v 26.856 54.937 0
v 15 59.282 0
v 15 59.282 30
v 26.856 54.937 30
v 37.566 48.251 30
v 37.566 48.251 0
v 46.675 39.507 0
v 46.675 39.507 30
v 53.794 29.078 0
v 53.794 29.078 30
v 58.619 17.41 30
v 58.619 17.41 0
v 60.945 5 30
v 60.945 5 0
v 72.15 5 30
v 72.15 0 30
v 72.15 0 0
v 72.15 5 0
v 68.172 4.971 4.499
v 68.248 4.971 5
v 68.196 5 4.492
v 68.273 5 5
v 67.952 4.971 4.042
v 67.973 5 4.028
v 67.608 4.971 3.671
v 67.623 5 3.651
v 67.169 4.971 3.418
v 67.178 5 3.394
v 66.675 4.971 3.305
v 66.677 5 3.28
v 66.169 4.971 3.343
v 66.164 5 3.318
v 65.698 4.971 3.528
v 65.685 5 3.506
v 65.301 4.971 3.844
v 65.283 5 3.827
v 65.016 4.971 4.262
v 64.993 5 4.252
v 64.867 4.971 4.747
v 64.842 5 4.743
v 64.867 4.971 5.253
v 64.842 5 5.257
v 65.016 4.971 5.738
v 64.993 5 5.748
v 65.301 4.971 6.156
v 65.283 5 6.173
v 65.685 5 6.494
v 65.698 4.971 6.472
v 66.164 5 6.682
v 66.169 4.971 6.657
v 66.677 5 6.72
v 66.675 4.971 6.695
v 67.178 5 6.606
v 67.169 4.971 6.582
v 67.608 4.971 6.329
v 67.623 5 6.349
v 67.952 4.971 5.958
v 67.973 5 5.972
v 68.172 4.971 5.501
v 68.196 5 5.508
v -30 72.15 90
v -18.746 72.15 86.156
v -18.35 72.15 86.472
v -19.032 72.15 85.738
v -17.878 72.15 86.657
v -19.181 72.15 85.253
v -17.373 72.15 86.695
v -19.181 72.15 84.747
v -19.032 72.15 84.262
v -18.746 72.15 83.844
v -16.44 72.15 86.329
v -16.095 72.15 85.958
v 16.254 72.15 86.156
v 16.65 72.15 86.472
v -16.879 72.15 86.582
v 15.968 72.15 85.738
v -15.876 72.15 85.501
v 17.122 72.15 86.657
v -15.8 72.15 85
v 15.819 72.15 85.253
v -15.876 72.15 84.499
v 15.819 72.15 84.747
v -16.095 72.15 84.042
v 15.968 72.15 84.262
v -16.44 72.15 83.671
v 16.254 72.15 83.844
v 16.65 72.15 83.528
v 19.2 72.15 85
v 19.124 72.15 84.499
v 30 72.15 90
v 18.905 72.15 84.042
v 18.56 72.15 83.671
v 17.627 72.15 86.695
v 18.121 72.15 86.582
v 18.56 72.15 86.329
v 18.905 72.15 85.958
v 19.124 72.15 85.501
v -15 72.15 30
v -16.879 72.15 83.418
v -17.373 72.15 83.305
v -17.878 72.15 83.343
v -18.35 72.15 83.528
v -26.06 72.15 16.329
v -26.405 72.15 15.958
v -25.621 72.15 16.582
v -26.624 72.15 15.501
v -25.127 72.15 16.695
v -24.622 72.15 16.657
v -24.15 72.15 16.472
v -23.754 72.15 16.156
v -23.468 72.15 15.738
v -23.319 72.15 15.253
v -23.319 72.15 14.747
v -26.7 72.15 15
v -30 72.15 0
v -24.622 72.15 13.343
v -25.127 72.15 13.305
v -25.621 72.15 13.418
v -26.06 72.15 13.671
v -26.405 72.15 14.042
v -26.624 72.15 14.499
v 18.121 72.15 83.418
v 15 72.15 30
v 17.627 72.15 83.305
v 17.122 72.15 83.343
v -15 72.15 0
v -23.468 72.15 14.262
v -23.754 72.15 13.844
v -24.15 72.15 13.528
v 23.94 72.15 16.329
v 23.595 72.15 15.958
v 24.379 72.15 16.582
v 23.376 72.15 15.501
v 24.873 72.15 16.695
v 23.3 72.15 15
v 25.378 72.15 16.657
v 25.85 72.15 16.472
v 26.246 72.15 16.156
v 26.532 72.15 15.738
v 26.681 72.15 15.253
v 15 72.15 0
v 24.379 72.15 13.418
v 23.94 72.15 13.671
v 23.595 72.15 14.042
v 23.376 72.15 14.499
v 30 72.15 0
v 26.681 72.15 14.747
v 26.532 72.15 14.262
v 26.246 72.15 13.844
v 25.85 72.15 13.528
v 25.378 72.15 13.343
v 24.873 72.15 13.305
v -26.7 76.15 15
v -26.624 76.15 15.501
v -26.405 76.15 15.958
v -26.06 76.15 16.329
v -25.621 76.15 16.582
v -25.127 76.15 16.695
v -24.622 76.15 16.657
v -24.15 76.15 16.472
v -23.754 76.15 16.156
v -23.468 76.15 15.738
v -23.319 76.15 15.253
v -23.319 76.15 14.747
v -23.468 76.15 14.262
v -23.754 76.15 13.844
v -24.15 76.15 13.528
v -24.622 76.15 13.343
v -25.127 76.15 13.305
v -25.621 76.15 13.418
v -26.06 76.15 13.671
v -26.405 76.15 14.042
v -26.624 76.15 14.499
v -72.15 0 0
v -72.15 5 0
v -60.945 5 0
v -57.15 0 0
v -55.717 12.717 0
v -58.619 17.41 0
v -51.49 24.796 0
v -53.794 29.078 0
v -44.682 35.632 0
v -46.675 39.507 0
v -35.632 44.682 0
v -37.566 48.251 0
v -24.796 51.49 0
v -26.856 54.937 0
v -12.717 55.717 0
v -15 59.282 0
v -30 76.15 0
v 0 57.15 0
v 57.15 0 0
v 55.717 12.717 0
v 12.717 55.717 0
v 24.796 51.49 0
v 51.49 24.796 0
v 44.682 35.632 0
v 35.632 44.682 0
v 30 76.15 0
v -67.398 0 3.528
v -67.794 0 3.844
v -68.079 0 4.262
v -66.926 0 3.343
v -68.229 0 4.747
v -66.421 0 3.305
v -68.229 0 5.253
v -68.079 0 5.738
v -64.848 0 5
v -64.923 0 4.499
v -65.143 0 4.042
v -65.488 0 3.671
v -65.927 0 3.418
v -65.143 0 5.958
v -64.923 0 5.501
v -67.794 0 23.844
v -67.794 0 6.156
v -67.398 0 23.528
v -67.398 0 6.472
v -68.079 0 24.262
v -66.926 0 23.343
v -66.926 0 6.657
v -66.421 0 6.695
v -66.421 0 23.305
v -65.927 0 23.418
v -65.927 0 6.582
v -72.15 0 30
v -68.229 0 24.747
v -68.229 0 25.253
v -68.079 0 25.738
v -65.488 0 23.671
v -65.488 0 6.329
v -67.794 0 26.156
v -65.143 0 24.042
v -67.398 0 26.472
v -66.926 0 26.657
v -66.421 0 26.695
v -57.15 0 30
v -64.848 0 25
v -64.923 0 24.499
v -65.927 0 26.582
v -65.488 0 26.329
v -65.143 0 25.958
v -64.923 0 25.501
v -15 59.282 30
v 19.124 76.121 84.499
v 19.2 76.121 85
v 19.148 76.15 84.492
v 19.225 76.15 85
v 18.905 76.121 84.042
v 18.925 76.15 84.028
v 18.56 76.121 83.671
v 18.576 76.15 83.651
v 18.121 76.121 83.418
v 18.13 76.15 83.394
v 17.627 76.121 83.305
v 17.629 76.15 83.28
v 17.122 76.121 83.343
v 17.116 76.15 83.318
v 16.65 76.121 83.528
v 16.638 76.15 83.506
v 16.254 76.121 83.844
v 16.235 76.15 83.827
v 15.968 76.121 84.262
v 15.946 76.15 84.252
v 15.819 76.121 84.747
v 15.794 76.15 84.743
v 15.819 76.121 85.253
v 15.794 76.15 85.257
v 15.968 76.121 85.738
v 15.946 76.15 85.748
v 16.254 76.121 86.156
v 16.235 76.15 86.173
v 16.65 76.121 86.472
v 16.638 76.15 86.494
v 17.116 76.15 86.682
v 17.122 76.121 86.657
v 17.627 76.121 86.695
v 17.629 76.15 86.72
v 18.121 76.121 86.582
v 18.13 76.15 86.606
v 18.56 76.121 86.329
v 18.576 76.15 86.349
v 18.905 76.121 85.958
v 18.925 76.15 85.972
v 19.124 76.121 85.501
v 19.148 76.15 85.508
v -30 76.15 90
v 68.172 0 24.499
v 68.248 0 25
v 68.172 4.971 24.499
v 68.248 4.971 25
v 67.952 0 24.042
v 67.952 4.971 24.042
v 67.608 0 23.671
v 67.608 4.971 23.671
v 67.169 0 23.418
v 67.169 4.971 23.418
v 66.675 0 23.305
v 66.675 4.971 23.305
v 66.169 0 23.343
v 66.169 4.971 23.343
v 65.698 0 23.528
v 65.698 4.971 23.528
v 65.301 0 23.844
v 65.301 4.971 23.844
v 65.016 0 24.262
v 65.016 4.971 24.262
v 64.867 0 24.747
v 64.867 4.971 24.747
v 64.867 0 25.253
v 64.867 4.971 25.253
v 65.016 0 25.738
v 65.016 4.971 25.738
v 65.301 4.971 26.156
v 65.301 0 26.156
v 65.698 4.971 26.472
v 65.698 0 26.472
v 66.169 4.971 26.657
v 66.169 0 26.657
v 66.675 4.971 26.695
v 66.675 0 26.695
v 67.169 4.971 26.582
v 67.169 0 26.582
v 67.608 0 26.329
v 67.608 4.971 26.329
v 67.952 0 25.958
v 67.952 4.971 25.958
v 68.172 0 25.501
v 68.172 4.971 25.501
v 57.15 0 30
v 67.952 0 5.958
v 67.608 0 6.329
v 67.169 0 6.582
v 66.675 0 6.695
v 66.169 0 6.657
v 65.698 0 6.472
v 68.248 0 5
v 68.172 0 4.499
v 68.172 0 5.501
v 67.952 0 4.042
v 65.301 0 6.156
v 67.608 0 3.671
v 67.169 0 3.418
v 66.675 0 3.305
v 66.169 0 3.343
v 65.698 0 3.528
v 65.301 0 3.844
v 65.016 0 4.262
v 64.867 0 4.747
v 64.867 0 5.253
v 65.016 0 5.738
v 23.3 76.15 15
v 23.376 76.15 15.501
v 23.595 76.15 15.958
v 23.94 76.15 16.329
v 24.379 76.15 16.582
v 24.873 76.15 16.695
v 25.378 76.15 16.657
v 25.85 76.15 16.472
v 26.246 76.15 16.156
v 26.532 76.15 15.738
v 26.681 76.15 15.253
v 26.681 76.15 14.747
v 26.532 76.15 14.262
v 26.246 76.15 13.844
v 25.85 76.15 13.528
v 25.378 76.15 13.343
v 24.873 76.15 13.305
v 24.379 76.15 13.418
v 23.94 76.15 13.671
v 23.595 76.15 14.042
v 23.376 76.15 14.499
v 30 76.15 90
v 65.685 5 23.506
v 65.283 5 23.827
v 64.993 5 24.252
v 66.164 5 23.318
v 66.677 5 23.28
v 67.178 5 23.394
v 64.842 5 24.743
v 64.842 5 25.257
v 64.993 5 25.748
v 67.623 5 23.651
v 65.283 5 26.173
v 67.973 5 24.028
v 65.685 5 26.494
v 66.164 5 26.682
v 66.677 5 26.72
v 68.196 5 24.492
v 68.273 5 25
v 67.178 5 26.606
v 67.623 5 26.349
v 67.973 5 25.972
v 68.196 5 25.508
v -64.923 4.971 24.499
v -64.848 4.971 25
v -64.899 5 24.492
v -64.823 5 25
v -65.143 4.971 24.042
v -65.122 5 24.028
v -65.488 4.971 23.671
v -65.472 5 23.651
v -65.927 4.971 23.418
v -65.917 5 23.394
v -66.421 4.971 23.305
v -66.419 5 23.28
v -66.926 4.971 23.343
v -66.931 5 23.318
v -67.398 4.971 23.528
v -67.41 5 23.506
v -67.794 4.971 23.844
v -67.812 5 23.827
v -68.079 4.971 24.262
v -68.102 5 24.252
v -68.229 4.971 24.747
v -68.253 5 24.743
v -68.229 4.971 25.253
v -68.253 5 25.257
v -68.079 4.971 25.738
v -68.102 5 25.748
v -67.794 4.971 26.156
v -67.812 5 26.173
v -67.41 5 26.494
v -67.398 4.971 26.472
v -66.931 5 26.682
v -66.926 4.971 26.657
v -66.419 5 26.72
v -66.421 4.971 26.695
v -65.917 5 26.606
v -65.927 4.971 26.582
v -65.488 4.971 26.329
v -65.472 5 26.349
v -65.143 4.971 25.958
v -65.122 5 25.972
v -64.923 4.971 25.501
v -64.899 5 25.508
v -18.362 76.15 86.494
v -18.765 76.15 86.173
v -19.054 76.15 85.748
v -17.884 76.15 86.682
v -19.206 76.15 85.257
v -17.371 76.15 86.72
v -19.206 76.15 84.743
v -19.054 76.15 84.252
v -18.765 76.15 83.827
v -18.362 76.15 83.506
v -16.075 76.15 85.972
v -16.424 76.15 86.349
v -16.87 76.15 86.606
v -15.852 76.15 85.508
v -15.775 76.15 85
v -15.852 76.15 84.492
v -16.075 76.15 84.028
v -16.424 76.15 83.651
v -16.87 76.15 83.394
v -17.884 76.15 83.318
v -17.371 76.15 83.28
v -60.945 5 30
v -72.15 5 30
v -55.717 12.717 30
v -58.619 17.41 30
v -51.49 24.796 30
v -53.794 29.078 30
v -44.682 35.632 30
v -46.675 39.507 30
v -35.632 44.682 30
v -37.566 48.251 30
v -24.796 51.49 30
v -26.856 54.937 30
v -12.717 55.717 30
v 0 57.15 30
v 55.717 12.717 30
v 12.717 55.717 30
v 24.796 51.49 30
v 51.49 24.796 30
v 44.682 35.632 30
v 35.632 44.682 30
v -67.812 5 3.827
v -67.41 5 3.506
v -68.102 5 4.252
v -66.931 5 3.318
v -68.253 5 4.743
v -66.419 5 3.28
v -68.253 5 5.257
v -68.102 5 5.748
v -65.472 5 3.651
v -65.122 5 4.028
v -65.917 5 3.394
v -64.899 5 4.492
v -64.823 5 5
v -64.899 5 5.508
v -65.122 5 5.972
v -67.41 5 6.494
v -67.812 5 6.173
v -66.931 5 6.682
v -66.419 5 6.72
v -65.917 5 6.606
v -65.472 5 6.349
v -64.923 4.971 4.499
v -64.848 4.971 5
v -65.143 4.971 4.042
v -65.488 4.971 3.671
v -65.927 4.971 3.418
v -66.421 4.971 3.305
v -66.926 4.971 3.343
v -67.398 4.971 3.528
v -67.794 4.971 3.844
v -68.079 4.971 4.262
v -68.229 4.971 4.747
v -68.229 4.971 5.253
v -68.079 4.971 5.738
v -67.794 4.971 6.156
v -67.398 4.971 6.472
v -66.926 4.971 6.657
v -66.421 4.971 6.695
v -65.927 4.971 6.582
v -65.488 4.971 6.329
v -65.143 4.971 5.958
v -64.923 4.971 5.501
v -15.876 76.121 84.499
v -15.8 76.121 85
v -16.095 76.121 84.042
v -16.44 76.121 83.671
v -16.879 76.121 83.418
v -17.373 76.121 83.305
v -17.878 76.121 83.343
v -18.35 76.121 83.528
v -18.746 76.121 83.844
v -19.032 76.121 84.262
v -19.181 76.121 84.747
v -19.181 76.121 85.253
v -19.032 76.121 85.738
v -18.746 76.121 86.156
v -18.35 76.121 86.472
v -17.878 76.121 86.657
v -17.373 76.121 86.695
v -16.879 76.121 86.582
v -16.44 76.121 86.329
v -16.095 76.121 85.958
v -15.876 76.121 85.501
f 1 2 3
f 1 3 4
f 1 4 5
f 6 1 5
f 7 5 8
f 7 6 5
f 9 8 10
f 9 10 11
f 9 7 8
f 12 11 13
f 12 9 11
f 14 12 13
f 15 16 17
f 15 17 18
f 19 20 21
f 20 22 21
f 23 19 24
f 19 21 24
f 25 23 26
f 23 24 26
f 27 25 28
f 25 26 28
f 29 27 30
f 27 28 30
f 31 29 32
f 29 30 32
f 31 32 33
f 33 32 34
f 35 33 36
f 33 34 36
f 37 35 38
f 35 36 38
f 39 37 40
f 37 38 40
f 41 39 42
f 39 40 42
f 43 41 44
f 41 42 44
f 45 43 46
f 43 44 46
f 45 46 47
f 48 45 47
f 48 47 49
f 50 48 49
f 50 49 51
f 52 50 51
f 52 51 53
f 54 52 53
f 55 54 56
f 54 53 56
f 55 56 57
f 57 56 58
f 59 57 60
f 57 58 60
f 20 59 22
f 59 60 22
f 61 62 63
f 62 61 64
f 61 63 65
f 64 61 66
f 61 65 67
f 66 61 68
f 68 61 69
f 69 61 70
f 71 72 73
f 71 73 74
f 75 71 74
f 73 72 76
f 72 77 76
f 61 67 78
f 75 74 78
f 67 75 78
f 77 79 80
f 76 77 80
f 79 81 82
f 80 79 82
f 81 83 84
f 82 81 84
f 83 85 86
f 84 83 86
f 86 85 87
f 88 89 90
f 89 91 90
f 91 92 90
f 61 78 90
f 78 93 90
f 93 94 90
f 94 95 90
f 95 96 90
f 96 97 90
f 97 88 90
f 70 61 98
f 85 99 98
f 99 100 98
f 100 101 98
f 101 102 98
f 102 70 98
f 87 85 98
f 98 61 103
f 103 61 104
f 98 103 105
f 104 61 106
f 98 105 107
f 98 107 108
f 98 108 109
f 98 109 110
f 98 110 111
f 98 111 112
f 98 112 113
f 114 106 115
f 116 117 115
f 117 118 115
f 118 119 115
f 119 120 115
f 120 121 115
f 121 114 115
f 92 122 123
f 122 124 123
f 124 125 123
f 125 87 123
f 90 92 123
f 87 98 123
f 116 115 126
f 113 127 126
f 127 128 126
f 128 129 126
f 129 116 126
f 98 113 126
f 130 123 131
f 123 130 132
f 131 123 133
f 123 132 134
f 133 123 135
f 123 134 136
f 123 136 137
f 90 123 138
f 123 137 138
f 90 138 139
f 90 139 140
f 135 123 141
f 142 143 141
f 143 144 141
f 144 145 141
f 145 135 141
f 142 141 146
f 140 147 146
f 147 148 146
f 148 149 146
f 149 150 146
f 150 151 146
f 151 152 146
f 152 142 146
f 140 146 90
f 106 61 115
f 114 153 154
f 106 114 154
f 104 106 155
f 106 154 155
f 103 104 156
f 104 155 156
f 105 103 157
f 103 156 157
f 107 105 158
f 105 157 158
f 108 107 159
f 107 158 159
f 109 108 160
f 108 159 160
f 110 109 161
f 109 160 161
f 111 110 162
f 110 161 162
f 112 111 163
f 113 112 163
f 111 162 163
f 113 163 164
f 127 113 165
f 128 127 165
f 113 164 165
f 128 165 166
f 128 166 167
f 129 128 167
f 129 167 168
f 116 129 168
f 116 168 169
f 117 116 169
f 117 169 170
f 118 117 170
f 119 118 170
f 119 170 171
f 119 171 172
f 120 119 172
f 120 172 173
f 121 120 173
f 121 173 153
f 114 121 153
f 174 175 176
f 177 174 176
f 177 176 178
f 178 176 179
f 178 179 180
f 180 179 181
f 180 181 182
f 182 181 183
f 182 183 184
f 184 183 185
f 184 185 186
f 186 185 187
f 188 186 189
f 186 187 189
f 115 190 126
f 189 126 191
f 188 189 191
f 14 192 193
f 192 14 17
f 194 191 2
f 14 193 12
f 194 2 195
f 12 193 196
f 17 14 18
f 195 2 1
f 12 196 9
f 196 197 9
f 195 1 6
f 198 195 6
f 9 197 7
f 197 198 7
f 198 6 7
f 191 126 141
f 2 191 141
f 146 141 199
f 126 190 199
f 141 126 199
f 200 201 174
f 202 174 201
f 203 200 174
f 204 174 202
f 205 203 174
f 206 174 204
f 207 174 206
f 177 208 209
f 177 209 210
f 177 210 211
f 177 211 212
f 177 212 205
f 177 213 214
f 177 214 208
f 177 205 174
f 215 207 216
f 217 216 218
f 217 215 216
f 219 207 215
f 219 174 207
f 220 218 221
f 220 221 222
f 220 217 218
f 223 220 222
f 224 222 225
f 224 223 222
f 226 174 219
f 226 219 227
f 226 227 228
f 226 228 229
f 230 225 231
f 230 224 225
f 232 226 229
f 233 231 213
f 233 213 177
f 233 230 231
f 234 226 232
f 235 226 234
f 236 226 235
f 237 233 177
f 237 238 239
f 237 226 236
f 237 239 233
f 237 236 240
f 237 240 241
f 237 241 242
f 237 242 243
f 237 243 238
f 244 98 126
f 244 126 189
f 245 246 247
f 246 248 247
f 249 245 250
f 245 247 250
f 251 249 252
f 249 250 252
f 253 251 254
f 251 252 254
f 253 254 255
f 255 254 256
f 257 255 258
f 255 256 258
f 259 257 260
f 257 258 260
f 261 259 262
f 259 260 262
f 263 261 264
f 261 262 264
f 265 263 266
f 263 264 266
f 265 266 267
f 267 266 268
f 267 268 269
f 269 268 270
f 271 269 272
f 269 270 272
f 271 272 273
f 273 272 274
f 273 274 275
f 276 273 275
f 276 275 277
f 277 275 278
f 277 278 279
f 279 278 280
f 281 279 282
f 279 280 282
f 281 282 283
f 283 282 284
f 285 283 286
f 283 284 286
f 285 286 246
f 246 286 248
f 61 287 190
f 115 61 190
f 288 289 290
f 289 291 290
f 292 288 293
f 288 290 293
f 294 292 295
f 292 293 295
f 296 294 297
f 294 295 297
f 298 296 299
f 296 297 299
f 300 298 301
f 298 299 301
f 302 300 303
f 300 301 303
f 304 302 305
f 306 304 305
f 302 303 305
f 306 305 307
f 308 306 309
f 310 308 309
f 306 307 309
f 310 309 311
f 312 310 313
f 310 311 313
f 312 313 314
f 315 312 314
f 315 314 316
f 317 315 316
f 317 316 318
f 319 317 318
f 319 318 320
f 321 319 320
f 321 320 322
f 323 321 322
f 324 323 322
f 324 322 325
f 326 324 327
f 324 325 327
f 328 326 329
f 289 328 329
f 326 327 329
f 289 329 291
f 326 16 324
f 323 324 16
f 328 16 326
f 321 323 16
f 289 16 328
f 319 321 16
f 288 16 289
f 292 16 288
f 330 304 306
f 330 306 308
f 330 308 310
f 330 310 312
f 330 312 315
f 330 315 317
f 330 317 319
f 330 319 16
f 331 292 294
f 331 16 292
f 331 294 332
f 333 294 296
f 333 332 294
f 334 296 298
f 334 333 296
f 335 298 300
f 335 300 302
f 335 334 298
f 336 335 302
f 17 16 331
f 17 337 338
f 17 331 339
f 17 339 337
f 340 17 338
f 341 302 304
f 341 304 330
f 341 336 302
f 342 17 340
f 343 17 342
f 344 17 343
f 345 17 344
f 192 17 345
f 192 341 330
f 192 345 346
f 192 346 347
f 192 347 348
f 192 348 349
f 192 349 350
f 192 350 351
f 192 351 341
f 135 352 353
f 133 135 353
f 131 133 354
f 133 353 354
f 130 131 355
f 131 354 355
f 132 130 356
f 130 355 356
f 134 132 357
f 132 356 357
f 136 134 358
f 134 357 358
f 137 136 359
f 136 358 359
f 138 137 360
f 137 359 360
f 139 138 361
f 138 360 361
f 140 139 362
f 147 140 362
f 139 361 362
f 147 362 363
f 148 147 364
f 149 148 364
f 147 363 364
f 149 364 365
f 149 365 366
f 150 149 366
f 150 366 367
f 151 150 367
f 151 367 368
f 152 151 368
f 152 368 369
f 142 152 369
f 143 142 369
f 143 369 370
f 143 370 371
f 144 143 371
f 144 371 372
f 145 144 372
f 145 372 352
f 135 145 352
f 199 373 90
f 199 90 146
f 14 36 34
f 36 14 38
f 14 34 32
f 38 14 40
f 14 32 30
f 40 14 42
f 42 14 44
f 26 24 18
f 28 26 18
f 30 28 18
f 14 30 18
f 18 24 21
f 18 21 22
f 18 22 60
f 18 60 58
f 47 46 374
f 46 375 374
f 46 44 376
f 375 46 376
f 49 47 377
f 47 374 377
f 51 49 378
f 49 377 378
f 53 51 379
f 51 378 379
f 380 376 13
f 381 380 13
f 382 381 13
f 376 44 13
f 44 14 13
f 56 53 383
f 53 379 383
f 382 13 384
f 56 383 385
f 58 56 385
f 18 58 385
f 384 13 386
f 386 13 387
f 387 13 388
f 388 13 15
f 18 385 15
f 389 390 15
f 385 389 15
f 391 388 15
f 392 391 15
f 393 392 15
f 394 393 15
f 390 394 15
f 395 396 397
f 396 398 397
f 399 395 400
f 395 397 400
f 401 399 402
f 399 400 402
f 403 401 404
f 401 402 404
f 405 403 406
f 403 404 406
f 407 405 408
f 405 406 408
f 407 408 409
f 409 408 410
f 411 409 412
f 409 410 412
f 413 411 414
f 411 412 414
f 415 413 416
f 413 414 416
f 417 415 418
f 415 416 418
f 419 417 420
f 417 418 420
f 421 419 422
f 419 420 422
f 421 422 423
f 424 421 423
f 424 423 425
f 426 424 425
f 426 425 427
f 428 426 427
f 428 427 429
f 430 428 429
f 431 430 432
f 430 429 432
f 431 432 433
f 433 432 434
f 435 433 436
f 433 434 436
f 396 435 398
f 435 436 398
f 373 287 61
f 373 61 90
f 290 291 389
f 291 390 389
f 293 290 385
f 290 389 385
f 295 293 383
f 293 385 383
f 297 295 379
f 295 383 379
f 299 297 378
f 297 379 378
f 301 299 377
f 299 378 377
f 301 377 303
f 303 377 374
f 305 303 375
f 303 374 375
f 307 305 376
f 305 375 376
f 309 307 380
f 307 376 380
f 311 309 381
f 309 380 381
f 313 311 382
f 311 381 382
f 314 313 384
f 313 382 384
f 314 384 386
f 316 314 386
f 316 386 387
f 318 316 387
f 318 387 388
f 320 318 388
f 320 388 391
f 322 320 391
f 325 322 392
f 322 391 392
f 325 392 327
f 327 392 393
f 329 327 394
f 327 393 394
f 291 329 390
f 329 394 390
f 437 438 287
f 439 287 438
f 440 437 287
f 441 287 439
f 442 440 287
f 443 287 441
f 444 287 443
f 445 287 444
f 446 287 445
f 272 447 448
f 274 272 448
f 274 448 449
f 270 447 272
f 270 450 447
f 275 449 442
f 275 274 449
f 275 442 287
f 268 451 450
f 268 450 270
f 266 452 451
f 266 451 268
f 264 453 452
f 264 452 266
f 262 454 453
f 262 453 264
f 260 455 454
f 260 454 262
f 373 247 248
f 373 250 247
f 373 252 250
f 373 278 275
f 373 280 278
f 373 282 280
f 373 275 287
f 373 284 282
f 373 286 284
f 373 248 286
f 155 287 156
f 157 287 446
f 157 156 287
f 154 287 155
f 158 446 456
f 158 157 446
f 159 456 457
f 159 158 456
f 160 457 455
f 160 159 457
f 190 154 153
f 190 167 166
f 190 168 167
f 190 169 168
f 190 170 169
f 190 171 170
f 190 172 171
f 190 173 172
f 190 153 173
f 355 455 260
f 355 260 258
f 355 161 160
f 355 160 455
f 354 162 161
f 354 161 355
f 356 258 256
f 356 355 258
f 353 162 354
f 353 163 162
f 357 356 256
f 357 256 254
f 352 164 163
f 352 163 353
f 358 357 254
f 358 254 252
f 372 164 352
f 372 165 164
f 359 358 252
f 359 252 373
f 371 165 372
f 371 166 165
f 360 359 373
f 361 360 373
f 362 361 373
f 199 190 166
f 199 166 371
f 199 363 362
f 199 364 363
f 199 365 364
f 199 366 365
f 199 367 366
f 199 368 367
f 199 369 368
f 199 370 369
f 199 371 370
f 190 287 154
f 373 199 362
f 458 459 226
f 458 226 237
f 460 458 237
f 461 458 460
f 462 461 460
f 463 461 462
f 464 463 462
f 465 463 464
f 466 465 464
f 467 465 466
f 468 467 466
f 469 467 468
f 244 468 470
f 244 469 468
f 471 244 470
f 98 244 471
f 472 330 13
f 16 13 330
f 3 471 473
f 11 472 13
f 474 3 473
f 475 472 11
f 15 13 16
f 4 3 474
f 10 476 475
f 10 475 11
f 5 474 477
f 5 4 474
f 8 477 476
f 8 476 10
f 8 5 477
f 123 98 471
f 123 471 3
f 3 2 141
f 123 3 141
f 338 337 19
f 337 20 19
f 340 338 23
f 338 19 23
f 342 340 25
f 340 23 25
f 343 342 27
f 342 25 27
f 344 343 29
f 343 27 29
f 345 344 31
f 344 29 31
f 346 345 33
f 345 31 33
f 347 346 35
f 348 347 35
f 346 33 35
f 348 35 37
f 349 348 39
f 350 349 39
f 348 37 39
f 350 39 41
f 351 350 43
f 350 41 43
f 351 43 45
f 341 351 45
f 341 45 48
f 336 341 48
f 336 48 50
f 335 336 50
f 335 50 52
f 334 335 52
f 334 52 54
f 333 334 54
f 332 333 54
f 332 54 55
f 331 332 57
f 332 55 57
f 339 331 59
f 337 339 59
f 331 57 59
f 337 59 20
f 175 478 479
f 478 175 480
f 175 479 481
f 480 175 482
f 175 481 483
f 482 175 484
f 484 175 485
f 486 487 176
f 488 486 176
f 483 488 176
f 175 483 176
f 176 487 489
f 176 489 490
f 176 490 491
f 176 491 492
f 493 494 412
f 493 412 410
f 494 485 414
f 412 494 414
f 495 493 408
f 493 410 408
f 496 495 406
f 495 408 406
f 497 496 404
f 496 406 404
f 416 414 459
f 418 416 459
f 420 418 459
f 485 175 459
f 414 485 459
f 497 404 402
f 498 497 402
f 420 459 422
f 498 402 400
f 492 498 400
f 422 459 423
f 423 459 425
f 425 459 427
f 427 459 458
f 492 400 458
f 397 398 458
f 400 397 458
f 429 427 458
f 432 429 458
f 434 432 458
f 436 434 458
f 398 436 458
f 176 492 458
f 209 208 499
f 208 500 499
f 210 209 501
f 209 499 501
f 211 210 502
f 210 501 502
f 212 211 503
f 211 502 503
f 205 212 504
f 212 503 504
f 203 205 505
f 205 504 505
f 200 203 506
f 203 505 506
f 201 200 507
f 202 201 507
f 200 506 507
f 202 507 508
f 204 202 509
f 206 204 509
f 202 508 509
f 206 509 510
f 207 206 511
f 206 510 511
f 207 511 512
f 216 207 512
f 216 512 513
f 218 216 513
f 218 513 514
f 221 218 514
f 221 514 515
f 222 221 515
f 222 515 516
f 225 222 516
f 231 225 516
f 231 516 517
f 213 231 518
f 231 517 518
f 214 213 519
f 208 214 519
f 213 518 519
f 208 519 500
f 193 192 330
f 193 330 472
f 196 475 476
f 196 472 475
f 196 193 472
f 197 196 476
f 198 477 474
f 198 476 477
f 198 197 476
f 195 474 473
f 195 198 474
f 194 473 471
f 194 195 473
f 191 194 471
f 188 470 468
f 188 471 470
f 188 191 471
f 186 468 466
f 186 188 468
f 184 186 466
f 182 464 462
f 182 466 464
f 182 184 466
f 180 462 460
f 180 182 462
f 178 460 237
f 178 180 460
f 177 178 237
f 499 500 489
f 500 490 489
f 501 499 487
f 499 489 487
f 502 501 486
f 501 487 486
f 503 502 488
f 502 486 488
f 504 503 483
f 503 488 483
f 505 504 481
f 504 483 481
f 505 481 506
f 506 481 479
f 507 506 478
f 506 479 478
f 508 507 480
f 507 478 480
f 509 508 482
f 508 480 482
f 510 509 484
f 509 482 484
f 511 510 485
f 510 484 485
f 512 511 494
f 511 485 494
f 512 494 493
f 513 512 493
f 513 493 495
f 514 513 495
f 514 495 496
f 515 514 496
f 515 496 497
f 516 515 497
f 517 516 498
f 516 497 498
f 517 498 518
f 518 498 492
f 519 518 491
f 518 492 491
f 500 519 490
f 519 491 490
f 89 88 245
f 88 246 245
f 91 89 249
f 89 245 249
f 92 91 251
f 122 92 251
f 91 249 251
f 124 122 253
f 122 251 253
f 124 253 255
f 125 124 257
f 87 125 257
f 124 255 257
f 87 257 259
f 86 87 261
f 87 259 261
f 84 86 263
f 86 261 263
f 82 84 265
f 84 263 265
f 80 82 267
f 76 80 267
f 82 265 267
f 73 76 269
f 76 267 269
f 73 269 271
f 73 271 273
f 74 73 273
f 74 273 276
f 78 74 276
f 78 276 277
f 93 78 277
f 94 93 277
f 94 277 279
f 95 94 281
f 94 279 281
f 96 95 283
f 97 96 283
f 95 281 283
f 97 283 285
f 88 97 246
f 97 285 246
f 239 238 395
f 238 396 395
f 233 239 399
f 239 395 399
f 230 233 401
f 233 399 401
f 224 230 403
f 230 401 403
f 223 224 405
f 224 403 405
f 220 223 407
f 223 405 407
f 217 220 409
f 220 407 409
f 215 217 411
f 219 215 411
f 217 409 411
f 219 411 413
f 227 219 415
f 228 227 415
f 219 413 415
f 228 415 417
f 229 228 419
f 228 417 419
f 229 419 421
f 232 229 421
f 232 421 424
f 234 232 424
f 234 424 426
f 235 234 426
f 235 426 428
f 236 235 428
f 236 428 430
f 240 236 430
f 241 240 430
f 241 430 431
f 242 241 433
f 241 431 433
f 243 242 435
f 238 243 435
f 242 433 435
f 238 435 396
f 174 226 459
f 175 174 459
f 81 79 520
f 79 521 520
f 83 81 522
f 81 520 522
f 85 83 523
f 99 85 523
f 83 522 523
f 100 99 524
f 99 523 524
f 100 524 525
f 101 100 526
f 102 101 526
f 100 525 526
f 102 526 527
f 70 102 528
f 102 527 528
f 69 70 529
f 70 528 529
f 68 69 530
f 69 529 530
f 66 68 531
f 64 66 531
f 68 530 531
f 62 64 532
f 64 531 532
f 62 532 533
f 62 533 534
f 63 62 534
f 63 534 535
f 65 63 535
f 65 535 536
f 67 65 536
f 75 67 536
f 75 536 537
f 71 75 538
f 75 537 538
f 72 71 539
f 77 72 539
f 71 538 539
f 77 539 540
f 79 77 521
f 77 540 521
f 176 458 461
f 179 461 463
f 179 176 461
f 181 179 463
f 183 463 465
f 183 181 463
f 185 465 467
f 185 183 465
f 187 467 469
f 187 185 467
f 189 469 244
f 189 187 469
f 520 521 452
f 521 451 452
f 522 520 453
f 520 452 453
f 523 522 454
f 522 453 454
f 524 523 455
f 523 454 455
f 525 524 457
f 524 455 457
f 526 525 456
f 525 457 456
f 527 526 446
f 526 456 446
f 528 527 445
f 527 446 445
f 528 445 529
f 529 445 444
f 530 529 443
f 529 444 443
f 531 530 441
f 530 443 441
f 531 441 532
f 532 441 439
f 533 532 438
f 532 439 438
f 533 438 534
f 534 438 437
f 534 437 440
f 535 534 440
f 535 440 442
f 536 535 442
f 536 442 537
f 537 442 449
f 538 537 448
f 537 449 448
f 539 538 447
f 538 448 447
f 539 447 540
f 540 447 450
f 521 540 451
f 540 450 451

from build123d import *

# Parameters (mm, degrees)
EXTRUDE_1_DEPTH     = 30
SKETCH_2_W          = 15
SKETCH_2_H          = 5
EXTRUDE_2_DEPTH     = 30
EXTRUDE_3_DEPTH     = 30
CUT_EXTRUDE_1_REACH = 111.107
SKETCH_6_R          = 1.7
SKETCH_7_W          = 60
SKETCH_7_H          = 60
EXTRUDE_4_DEPTH     = 4


# Read off the part's stored shape, not the designer's step: M3 すきま穴1, M3 すきま穴2
with BuildPart() as part:
    # ｽｹｯﾁ1 → ﾎﾞｽ - 押し出し1 (new body)
    with BuildSketch(Plane.XY):
        with BuildLine():
            Line((-57.15, 0), (-61.15, 0))
            ThreePointArc((-61.15, 0), (0, 61.15), (61.15, 0))
            Line((61.15, 0), (57.15, 0))
            ThreePointArc((57.15, 0), (0, 57.15), (-57.15, 0))
        make_face()
    extrude(amount=EXTRUDE_1_DEPTH)

    # ｽｹｯﾁ2 → ﾎﾞｽ - 押し出し2 (add)
    with BuildSketch(Plane.XY.offset(30)):
        with Locations((-64.65, 2.5)):
            Rectangle(SKETCH_2_W, SKETCH_2_H)
        with Locations((64.65, 2.5)):
            Rectangle(SKETCH_2_W, SKETCH_2_H)
    extrude(amount=-EXTRUDE_2_DEPTH)

    # M3 すきま穴1 outline → M3 すきま穴1 (revolve, cut)
    with BuildSketch(Plane(origin=(66.547620908, 0, 25), x_dir=(1, 0, 0), z_dir=(0, 0, 1))):
        Polygon((0, 0), (1.7, 0), (1.7, 4.97124079), (1.725, 5), (0, 5), align=None)
    revolve(axis=Axis((66.547620908, 0, 25), (0, 1, 0)), mode=Mode.SUBTRACT)

    # Hole Wizard M3 _1 2 outline → Hole Wizard M3 _1 2 (revolve, cut)
    with BuildSketch(Plane(origin=(66.547620908, 0, 5), x_dir=(1, 0, 0), z_dir=(0, 0, 1))):
        Polygon((0, 0), (1.7, 0), (1.7, 4.97124079), (1.725, 5), (0, 5), align=None)
    revolve(axis=Axis((66.547620908, 0, 5), (0, 1, 0)), mode=Mode.SUBTRACT)

    # Hole Wizard M3 _1 3 outline → Hole Wizard M3 _1 3 (revolve, cut)
    with BuildSketch(Plane(origin=(-66.547620908, 0, 25), x_dir=(1, 0, 0), z_dir=(0, 0, 1))):
        Polygon((0, 0), (1.7, 0), (1.7, 4.97124079), (1.725, 5), (0, 5), align=None)
    revolve(axis=Axis((-66.547620908, 0, 25), (0, 1, 0)), mode=Mode.SUBTRACT)

    # Hole Wizard M3 _1 4 outline → Hole Wizard M3 _1 4 (revolve, cut)
    with BuildSketch(Plane(origin=(-66.547620908, 0, 5), x_dir=(1, 0, 0), z_dir=(0, 0, 1))):
        Polygon((0, 0), (1.7, 0), (1.7, 4.97124079), (1.725, 5), (0, 5), align=None)
    revolve(axis=Axis((-66.547620908, 0, 5), (0, 1, 0)), mode=Mode.SUBTRACT)

    # ｽｹｯﾁ5 → ﾎﾞｽ - 押し出し3 (add)
    with BuildSketch(Plane.XY.offset(30)):
        Polygon((-15, 57.15), (15, 57.15), (15, 72.15), (30, 72.15), (30, 76.15), (-30, 76.15), (-30, 72.15), (-15, 72.15), align=None)
    extrude(amount=-EXTRUDE_3_DEPTH)

    # ｽｹｯﾁ6 → ｶｯﾄ - 押し出し1 (cut, up to next)
    with BuildSketch(Plane(origin=(0, 76.15, 0), x_dir=(1, 0, 0), z_dir=(0, 1, 0)), mode=Mode.PRIVATE) as cut_extrude_1_sk1:
        with Locations(Location((-25, -15, 0), (0, 0, 180))):
            Circle(SKETCH_6_R)
    cut_extrude_1_tool1 = extrude(cut_extrude_1_sk1.sketch, amount=-CUT_EXTRUDE_1_REACH, mode=Mode.PRIVATE) & part.part
    # ｽｹｯﾁ6 → ｶｯﾄ - 押し出し1 (cut, up to next)
    with BuildSketch(Plane(origin=(0, 76.15, 0), x_dir=(1, 0, 0), z_dir=(0, 1, 0)), mode=Mode.PRIVATE) as cut_extrude_1_sk2:
        with Locations(Location((25, -15, 0), (0, 0, 180))):
            Circle(SKETCH_6_R)
    cut_extrude_1_tool2 = extrude(cut_extrude_1_sk2.sketch, amount=-CUT_EXTRUDE_1_REACH, mode=Mode.PRIVATE) & part.part
    add(cut_extrude_1_tool1.solids().sort_by_distance((-25, 76.15, 15))[0], mode=Mode.SUBTRACT)
    add(cut_extrude_1_tool2.solids().sort_by_distance((25, 76.15, 15))[0], mode=Mode.SUBTRACT)

    # ｽｹｯﾁ7 → ﾎﾞｽ - 押し出し4 (add)
    with BuildSketch(Plane(origin=(0, 76.15, 0), x_dir=(1, 0, 0), z_dir=(0, 1, 0))):
        with Locations((0, -60)):
            Rectangle(SKETCH_7_W, SKETCH_7_H)
    extrude(amount=-EXTRUDE_4_DEPTH)

    # M3 すきま穴2 outline → M3 すきま穴2 (revolve, cut)
    with BuildSketch(Plane(origin=(-17.5, 0, 85), x_dir=(1, 0, 0), z_dir=(0, 0, 1))):
        Polygon((0, 72.15), (1.7, 72.15), (1.7, 76.12124079), (1.725, 76.15), (0, 76.15), align=None)
    revolve(axis=Axis((-17.5, 0, 85), (0, 1, 0)), mode=Mode.SUBTRACT)

    # Hole Wizard M3 _2 2 outline → Hole Wizard M3 _2 2 (revolve, cut)
    with BuildSketch(Plane(origin=(17.5, 0, 85), x_dir=(1, 0, 0), z_dir=(0, 0, 1))):
        Polygon((0, 72.15), (1.7, 72.15), (1.7, 76.12124079), (1.725, 76.15), (0, 76.15), align=None)
    revolve(axis=Axis((17.5, 0, 85), (0, 1, 0)), mode=Mode.SUBTRACT)


solid = part.part
